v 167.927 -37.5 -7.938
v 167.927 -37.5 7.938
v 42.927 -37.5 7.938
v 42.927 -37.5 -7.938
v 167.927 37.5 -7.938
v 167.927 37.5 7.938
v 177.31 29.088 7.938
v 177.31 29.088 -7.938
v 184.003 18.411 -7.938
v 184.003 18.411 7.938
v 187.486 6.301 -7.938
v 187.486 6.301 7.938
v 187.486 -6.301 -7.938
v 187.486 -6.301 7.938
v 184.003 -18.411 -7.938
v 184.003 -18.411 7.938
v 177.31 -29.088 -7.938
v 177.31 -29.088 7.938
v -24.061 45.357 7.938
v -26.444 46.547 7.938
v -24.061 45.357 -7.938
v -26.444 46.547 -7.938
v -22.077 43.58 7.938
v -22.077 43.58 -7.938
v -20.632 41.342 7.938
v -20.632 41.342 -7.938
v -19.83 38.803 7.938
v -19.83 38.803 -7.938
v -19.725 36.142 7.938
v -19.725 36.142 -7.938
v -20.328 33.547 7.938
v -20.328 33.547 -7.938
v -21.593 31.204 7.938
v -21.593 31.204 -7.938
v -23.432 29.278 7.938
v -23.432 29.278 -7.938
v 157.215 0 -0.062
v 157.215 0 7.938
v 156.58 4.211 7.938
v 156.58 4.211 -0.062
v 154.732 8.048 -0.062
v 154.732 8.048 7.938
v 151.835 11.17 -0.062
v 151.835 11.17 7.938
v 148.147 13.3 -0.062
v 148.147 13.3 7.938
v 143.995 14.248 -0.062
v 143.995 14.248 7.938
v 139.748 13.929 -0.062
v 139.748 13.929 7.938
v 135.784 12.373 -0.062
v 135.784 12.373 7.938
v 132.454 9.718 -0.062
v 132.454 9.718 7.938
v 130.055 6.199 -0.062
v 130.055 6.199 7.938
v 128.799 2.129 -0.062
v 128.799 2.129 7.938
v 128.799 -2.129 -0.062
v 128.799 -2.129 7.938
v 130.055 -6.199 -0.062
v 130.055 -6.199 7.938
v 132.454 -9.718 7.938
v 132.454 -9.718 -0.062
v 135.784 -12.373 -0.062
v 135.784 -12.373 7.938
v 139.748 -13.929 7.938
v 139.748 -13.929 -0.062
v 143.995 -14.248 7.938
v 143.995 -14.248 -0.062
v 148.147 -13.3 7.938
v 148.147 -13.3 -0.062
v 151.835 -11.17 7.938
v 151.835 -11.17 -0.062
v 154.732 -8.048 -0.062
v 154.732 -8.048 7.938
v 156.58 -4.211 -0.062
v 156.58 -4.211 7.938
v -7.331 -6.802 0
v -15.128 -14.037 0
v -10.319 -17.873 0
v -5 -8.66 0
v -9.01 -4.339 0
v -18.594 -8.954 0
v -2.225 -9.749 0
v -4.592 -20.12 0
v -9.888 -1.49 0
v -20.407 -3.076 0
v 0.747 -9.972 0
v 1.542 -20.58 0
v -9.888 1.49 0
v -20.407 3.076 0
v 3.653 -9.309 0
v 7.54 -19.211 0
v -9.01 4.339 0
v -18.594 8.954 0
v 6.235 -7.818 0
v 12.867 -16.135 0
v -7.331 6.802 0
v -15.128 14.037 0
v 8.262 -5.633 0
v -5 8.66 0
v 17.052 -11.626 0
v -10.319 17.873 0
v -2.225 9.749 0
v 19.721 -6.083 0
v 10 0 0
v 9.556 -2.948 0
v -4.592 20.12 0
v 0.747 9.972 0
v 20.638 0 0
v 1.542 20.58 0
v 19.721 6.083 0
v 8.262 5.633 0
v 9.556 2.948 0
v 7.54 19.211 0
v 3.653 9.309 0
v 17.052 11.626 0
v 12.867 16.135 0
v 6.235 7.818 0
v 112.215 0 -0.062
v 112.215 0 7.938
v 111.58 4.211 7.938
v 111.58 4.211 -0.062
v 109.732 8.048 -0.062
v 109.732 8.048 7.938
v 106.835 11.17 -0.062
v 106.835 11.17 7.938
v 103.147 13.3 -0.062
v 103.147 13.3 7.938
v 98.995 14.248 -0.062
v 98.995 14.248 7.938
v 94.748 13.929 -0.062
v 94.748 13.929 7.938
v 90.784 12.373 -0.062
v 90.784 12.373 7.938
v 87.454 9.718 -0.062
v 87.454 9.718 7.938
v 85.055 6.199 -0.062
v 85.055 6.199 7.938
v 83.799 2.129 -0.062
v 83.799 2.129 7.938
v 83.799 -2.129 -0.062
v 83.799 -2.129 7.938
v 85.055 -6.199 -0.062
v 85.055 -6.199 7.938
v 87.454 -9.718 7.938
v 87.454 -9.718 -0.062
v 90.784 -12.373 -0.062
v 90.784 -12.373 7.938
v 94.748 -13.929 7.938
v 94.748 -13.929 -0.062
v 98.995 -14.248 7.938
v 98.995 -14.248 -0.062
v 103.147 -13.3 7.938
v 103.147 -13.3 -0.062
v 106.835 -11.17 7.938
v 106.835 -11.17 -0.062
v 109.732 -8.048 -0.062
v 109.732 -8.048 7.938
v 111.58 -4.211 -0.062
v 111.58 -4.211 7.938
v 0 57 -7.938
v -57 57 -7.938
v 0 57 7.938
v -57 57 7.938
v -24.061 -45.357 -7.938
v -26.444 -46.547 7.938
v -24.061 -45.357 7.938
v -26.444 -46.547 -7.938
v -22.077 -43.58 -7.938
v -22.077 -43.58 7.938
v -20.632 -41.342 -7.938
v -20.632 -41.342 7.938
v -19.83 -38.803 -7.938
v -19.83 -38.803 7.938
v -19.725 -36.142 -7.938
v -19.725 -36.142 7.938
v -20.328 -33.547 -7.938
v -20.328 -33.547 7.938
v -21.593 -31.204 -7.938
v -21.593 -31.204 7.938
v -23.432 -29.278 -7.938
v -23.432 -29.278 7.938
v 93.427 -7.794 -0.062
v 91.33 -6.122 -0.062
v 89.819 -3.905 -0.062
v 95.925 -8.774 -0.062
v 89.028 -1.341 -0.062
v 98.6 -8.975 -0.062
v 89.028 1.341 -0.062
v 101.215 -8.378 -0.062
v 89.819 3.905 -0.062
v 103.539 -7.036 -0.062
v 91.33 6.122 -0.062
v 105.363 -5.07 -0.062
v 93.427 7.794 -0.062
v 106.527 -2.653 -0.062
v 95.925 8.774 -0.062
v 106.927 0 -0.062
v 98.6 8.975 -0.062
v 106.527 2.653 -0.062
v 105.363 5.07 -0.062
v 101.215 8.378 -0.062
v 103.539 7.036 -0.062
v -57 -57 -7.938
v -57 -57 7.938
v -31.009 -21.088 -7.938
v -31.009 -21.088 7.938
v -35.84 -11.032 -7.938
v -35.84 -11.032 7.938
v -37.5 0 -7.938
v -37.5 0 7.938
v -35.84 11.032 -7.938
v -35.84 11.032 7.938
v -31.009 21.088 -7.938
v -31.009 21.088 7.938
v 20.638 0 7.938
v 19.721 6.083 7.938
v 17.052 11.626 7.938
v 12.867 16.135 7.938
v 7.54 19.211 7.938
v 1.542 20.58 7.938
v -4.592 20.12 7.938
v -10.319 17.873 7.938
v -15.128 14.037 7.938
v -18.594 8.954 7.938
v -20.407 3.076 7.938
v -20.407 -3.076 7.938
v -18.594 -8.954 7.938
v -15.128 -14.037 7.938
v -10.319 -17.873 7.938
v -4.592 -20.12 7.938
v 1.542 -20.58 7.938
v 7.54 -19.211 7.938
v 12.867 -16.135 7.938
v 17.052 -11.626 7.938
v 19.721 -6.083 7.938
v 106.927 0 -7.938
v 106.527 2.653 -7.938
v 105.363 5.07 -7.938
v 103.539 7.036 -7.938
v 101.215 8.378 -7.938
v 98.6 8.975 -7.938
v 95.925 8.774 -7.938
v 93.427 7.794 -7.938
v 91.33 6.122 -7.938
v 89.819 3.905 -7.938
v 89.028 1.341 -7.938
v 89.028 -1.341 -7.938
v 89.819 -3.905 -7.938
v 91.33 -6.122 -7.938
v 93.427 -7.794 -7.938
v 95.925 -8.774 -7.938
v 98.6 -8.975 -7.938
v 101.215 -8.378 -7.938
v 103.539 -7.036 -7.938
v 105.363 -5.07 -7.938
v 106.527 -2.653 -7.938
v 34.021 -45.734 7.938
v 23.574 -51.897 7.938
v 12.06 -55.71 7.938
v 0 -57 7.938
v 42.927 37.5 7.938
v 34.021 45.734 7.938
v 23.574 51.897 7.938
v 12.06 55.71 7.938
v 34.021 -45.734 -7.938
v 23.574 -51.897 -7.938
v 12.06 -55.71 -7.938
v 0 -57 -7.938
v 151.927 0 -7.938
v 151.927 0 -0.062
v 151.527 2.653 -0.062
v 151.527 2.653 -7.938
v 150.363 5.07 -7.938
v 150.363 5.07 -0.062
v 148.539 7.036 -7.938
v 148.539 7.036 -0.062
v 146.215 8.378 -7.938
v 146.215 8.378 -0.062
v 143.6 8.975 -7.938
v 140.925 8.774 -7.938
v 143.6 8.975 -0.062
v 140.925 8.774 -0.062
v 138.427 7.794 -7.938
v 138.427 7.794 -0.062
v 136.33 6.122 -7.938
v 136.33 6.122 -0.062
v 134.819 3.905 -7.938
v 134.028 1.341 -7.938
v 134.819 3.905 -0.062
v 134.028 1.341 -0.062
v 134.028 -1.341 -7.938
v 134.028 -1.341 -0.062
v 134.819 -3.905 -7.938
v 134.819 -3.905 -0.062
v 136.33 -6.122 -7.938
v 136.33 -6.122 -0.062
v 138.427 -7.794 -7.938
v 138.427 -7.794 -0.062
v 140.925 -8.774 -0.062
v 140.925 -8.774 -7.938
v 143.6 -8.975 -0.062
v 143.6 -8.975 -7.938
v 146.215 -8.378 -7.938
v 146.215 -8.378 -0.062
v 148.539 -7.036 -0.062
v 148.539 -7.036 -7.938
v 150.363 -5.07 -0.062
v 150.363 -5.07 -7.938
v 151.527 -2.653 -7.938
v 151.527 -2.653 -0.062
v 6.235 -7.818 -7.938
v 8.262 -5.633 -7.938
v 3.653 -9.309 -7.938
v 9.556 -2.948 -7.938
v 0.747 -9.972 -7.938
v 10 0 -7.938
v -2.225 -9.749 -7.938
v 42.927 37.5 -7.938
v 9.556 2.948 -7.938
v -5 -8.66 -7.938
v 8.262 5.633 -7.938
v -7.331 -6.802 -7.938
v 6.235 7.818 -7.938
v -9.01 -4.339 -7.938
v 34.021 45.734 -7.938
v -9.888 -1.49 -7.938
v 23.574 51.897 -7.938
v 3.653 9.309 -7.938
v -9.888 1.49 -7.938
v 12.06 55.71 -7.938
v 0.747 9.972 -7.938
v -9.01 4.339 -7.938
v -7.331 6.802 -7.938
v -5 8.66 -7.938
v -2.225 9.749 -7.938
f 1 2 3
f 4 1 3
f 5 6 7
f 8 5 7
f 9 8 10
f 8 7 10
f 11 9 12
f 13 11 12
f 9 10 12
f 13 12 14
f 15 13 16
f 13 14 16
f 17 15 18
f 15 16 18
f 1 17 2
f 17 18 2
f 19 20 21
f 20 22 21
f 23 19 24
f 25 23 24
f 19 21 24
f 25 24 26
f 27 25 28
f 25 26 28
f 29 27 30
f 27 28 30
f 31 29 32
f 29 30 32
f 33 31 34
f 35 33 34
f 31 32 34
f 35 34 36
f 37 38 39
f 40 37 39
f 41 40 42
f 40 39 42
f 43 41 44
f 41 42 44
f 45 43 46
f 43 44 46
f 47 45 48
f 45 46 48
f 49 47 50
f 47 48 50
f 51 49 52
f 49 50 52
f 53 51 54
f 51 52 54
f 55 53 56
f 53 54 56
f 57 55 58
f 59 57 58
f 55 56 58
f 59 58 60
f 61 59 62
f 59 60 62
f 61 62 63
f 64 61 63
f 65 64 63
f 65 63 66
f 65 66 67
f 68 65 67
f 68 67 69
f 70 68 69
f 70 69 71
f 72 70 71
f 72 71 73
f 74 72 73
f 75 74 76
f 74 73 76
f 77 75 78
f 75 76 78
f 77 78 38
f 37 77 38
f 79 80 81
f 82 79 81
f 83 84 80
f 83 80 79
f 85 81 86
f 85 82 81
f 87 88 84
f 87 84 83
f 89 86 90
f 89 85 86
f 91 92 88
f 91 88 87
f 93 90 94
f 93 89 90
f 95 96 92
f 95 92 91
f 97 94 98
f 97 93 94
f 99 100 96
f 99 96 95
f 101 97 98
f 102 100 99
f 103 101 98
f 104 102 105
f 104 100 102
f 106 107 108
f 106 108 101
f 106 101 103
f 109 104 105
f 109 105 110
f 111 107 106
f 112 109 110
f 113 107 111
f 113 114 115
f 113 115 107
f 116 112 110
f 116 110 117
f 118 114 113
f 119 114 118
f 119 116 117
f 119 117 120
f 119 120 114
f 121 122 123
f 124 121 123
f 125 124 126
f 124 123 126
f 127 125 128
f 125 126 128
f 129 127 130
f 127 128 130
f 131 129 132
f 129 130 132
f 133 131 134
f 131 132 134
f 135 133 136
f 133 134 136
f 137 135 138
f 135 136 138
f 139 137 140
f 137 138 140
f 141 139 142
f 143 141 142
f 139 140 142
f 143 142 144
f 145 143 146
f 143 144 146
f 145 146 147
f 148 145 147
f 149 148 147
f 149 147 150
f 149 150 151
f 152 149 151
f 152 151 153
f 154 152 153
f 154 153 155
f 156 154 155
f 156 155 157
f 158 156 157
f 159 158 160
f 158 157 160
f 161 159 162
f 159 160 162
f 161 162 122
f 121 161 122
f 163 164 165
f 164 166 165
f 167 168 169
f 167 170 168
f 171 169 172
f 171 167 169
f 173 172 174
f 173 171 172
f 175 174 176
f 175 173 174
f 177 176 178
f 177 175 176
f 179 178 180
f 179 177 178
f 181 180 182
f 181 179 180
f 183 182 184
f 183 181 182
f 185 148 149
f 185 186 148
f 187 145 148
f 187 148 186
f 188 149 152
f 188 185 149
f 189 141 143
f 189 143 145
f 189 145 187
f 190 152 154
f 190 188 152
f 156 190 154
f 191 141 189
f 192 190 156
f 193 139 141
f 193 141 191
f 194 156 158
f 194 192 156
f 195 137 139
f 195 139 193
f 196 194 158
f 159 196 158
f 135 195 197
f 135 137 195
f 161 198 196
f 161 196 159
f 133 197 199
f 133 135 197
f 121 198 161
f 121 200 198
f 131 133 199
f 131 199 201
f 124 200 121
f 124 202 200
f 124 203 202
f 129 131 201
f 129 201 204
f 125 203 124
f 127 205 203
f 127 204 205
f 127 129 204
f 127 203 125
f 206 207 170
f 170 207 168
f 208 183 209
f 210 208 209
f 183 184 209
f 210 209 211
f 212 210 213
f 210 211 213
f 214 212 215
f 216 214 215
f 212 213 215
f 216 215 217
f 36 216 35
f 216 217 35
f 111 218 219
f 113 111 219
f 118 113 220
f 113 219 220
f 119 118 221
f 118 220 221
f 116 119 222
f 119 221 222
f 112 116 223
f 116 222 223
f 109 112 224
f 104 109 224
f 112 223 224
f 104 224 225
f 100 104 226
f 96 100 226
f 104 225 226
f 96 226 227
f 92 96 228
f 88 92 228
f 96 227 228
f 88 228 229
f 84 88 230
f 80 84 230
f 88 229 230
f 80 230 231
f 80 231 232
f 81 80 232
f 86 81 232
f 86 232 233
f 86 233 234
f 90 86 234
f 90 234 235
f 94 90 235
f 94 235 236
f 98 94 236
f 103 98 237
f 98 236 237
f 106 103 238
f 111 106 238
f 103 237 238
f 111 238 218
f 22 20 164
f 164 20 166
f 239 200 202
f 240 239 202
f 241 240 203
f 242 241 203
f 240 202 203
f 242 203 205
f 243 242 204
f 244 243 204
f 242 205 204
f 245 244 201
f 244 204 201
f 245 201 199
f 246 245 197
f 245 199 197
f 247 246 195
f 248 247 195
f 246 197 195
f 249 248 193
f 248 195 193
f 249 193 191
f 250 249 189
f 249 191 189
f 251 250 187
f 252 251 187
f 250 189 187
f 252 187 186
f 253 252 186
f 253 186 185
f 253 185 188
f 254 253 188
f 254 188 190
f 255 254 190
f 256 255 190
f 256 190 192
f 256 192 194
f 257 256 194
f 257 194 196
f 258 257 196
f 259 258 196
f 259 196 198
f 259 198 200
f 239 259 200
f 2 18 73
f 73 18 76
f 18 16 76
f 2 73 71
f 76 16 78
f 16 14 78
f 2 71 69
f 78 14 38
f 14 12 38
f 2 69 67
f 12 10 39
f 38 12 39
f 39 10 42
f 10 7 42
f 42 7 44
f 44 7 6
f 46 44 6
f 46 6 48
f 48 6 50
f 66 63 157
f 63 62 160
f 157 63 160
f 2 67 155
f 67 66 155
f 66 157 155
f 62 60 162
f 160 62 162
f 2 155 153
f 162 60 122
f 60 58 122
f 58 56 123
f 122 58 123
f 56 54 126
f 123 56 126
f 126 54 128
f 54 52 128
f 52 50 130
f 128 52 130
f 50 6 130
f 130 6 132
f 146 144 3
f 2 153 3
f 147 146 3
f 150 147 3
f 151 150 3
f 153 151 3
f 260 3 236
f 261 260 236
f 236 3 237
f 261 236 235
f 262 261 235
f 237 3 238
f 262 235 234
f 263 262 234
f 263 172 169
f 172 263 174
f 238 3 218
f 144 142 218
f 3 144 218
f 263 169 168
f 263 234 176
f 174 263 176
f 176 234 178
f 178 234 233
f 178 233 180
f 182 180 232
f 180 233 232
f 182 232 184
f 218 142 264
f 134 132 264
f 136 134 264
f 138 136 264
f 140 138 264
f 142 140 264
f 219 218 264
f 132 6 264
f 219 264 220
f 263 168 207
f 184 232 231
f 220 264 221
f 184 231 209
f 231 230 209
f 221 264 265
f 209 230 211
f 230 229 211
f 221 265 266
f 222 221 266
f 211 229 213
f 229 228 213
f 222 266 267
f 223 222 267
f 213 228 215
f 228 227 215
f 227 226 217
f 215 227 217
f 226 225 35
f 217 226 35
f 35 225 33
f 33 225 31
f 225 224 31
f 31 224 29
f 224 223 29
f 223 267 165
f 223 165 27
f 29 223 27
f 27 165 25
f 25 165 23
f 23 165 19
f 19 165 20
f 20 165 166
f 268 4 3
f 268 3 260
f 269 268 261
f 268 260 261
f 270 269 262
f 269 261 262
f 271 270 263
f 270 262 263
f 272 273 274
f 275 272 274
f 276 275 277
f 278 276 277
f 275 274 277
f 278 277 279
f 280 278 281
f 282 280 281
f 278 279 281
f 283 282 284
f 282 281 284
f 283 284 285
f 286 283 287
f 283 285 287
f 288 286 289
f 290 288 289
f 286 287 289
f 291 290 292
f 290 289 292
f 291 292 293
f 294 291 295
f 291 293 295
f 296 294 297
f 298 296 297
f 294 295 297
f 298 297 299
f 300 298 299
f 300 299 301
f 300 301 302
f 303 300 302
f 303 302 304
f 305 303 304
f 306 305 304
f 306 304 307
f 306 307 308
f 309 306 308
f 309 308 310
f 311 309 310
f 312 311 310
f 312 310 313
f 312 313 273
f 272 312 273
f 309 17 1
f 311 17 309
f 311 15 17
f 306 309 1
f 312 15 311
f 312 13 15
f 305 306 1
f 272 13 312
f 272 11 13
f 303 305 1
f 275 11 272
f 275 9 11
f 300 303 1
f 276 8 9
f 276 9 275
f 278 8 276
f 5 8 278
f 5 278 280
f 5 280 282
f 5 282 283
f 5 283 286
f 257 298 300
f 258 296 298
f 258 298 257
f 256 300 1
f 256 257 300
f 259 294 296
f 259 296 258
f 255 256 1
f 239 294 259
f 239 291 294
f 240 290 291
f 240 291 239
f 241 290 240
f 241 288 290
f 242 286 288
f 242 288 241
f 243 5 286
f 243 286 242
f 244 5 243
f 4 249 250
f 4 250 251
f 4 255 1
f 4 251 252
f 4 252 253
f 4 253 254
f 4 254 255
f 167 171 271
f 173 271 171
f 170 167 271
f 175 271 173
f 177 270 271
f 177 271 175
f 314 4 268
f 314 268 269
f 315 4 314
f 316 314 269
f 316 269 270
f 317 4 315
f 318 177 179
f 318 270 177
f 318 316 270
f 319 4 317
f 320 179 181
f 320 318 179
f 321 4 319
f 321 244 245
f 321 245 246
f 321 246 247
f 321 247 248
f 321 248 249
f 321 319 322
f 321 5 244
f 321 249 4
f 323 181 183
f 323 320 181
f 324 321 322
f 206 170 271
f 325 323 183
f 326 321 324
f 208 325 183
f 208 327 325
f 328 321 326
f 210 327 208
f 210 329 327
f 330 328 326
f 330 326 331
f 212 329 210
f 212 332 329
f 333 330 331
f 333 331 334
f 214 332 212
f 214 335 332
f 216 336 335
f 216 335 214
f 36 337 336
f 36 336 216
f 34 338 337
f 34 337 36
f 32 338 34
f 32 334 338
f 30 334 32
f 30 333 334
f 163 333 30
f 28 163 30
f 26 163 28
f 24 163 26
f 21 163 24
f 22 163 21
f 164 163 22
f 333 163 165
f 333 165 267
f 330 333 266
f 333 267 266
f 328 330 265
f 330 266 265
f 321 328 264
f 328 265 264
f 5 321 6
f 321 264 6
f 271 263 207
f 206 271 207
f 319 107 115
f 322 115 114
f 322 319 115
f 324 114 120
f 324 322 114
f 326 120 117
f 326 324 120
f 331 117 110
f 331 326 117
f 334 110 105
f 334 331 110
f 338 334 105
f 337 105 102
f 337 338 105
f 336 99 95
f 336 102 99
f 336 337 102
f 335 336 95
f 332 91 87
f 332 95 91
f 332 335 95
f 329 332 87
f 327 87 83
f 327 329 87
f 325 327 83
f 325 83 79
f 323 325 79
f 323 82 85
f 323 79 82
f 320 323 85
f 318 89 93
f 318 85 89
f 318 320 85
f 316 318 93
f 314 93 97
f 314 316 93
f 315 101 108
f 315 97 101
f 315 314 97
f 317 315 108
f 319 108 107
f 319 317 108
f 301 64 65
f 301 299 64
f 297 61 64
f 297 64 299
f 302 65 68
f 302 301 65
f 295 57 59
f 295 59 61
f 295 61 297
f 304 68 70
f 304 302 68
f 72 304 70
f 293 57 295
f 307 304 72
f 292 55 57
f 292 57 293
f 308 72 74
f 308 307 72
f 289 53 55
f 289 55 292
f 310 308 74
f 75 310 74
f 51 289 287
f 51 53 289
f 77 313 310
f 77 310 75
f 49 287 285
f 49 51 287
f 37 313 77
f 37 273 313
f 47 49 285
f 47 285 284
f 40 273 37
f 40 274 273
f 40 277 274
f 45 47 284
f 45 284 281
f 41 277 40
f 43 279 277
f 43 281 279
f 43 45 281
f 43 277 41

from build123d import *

# Parameters (mm, degrees)
SKETCH1_R           = 10
BOSS_EXTRUDE1_DEPTH = 7.9375
FILLET1_R           = 10
SKETCH2_R           = 14.2875
CUT_EXTRUDE1_DEPTH  = 8
SKETCH3_R           = 9
CUT_EXTRUDE2_DEPTH  = 198.022009439
SKETCH4_R           = 20.6375
CUT_EXTRUDE3_DEPTH  = 7.9375


with BuildPart() as part:
    # Sketch1 → Boss-Extrude1 (new, symmetric)
    with BuildSketch(Plane.XY):
        with BuildLine():
            Line((-57, -57), (0, -37.5))
            ThreePointArc((0, -37.5), (-37.5, 0), (0, 37.5))
            Line((0, 37.5), (-57, 57))
            Line((-57, 57), (0, 57))
            ThreePointArc((0, 57), (23.574350468, 51.896531676), (42.927264064, 37.5))
            Line((42.927264064, 37.5), (167.927264064, 37.5))
            ThreePointArc((167.927264064, 37.5), (187.927264064, 0), (167.927264064, -37.5))
            Line((167.927264064, -37.5), (42.927264064, -37.5))
            ThreePointArc((42.927264064, -37.5), (23.574350468, -51.896531676), (0, -57))
            Line((0, -57), (-57, -57))
        make_face()
        Circle(SKETCH1_R, mode=Mode.SUBTRACT)
    extrude(amount=BOSS_EXTRUDE1_DEPTH, both=True)

    # Fillet1
    fillet1_edges = [part.edges().sort_by_distance(p)[0] for p in [
        (0, -37.5, 0),
        (0, 37.5, 0),
    ]]
    fillet(fillet1_edges, radius=FILLET1_R)

    # Sketch2 → Cut-Extrude1 (cut)
    with BuildSketch(Plane.XY.offset(7.9375)):
        with Locations((142.927264064, 0)):
            Circle(SKETCH2_R)
        with Locations((97.927264064, 0)):
            Circle(SKETCH2_R)
    extrude(amount=-CUT_EXTRUDE1_DEPTH, mode=Mode.SUBTRACT)

    # Sketch3 → Cut-Extrude2 (cut, through all)
    with BuildSketch(Plane.XY.offset(7.9375)):
        with Locations((97.927264064, 0)):
            Circle(SKETCH3_R)
        with Locations((142.927264064, 0)):
            Circle(SKETCH3_R)
    extrude(amount=-CUT_EXTRUDE2_DEPTH, mode=Mode.SUBTRACT)

    # Sketch4 → Cut-Extrude3 (cut)
    with BuildSketch(Plane.XY.offset(7.9375)):
        Circle(SKETCH4_R)
    extrude(amount=-CUT_EXTRUDE3_DEPTH, mode=Mode.SUBTRACT)


solid = part.part
